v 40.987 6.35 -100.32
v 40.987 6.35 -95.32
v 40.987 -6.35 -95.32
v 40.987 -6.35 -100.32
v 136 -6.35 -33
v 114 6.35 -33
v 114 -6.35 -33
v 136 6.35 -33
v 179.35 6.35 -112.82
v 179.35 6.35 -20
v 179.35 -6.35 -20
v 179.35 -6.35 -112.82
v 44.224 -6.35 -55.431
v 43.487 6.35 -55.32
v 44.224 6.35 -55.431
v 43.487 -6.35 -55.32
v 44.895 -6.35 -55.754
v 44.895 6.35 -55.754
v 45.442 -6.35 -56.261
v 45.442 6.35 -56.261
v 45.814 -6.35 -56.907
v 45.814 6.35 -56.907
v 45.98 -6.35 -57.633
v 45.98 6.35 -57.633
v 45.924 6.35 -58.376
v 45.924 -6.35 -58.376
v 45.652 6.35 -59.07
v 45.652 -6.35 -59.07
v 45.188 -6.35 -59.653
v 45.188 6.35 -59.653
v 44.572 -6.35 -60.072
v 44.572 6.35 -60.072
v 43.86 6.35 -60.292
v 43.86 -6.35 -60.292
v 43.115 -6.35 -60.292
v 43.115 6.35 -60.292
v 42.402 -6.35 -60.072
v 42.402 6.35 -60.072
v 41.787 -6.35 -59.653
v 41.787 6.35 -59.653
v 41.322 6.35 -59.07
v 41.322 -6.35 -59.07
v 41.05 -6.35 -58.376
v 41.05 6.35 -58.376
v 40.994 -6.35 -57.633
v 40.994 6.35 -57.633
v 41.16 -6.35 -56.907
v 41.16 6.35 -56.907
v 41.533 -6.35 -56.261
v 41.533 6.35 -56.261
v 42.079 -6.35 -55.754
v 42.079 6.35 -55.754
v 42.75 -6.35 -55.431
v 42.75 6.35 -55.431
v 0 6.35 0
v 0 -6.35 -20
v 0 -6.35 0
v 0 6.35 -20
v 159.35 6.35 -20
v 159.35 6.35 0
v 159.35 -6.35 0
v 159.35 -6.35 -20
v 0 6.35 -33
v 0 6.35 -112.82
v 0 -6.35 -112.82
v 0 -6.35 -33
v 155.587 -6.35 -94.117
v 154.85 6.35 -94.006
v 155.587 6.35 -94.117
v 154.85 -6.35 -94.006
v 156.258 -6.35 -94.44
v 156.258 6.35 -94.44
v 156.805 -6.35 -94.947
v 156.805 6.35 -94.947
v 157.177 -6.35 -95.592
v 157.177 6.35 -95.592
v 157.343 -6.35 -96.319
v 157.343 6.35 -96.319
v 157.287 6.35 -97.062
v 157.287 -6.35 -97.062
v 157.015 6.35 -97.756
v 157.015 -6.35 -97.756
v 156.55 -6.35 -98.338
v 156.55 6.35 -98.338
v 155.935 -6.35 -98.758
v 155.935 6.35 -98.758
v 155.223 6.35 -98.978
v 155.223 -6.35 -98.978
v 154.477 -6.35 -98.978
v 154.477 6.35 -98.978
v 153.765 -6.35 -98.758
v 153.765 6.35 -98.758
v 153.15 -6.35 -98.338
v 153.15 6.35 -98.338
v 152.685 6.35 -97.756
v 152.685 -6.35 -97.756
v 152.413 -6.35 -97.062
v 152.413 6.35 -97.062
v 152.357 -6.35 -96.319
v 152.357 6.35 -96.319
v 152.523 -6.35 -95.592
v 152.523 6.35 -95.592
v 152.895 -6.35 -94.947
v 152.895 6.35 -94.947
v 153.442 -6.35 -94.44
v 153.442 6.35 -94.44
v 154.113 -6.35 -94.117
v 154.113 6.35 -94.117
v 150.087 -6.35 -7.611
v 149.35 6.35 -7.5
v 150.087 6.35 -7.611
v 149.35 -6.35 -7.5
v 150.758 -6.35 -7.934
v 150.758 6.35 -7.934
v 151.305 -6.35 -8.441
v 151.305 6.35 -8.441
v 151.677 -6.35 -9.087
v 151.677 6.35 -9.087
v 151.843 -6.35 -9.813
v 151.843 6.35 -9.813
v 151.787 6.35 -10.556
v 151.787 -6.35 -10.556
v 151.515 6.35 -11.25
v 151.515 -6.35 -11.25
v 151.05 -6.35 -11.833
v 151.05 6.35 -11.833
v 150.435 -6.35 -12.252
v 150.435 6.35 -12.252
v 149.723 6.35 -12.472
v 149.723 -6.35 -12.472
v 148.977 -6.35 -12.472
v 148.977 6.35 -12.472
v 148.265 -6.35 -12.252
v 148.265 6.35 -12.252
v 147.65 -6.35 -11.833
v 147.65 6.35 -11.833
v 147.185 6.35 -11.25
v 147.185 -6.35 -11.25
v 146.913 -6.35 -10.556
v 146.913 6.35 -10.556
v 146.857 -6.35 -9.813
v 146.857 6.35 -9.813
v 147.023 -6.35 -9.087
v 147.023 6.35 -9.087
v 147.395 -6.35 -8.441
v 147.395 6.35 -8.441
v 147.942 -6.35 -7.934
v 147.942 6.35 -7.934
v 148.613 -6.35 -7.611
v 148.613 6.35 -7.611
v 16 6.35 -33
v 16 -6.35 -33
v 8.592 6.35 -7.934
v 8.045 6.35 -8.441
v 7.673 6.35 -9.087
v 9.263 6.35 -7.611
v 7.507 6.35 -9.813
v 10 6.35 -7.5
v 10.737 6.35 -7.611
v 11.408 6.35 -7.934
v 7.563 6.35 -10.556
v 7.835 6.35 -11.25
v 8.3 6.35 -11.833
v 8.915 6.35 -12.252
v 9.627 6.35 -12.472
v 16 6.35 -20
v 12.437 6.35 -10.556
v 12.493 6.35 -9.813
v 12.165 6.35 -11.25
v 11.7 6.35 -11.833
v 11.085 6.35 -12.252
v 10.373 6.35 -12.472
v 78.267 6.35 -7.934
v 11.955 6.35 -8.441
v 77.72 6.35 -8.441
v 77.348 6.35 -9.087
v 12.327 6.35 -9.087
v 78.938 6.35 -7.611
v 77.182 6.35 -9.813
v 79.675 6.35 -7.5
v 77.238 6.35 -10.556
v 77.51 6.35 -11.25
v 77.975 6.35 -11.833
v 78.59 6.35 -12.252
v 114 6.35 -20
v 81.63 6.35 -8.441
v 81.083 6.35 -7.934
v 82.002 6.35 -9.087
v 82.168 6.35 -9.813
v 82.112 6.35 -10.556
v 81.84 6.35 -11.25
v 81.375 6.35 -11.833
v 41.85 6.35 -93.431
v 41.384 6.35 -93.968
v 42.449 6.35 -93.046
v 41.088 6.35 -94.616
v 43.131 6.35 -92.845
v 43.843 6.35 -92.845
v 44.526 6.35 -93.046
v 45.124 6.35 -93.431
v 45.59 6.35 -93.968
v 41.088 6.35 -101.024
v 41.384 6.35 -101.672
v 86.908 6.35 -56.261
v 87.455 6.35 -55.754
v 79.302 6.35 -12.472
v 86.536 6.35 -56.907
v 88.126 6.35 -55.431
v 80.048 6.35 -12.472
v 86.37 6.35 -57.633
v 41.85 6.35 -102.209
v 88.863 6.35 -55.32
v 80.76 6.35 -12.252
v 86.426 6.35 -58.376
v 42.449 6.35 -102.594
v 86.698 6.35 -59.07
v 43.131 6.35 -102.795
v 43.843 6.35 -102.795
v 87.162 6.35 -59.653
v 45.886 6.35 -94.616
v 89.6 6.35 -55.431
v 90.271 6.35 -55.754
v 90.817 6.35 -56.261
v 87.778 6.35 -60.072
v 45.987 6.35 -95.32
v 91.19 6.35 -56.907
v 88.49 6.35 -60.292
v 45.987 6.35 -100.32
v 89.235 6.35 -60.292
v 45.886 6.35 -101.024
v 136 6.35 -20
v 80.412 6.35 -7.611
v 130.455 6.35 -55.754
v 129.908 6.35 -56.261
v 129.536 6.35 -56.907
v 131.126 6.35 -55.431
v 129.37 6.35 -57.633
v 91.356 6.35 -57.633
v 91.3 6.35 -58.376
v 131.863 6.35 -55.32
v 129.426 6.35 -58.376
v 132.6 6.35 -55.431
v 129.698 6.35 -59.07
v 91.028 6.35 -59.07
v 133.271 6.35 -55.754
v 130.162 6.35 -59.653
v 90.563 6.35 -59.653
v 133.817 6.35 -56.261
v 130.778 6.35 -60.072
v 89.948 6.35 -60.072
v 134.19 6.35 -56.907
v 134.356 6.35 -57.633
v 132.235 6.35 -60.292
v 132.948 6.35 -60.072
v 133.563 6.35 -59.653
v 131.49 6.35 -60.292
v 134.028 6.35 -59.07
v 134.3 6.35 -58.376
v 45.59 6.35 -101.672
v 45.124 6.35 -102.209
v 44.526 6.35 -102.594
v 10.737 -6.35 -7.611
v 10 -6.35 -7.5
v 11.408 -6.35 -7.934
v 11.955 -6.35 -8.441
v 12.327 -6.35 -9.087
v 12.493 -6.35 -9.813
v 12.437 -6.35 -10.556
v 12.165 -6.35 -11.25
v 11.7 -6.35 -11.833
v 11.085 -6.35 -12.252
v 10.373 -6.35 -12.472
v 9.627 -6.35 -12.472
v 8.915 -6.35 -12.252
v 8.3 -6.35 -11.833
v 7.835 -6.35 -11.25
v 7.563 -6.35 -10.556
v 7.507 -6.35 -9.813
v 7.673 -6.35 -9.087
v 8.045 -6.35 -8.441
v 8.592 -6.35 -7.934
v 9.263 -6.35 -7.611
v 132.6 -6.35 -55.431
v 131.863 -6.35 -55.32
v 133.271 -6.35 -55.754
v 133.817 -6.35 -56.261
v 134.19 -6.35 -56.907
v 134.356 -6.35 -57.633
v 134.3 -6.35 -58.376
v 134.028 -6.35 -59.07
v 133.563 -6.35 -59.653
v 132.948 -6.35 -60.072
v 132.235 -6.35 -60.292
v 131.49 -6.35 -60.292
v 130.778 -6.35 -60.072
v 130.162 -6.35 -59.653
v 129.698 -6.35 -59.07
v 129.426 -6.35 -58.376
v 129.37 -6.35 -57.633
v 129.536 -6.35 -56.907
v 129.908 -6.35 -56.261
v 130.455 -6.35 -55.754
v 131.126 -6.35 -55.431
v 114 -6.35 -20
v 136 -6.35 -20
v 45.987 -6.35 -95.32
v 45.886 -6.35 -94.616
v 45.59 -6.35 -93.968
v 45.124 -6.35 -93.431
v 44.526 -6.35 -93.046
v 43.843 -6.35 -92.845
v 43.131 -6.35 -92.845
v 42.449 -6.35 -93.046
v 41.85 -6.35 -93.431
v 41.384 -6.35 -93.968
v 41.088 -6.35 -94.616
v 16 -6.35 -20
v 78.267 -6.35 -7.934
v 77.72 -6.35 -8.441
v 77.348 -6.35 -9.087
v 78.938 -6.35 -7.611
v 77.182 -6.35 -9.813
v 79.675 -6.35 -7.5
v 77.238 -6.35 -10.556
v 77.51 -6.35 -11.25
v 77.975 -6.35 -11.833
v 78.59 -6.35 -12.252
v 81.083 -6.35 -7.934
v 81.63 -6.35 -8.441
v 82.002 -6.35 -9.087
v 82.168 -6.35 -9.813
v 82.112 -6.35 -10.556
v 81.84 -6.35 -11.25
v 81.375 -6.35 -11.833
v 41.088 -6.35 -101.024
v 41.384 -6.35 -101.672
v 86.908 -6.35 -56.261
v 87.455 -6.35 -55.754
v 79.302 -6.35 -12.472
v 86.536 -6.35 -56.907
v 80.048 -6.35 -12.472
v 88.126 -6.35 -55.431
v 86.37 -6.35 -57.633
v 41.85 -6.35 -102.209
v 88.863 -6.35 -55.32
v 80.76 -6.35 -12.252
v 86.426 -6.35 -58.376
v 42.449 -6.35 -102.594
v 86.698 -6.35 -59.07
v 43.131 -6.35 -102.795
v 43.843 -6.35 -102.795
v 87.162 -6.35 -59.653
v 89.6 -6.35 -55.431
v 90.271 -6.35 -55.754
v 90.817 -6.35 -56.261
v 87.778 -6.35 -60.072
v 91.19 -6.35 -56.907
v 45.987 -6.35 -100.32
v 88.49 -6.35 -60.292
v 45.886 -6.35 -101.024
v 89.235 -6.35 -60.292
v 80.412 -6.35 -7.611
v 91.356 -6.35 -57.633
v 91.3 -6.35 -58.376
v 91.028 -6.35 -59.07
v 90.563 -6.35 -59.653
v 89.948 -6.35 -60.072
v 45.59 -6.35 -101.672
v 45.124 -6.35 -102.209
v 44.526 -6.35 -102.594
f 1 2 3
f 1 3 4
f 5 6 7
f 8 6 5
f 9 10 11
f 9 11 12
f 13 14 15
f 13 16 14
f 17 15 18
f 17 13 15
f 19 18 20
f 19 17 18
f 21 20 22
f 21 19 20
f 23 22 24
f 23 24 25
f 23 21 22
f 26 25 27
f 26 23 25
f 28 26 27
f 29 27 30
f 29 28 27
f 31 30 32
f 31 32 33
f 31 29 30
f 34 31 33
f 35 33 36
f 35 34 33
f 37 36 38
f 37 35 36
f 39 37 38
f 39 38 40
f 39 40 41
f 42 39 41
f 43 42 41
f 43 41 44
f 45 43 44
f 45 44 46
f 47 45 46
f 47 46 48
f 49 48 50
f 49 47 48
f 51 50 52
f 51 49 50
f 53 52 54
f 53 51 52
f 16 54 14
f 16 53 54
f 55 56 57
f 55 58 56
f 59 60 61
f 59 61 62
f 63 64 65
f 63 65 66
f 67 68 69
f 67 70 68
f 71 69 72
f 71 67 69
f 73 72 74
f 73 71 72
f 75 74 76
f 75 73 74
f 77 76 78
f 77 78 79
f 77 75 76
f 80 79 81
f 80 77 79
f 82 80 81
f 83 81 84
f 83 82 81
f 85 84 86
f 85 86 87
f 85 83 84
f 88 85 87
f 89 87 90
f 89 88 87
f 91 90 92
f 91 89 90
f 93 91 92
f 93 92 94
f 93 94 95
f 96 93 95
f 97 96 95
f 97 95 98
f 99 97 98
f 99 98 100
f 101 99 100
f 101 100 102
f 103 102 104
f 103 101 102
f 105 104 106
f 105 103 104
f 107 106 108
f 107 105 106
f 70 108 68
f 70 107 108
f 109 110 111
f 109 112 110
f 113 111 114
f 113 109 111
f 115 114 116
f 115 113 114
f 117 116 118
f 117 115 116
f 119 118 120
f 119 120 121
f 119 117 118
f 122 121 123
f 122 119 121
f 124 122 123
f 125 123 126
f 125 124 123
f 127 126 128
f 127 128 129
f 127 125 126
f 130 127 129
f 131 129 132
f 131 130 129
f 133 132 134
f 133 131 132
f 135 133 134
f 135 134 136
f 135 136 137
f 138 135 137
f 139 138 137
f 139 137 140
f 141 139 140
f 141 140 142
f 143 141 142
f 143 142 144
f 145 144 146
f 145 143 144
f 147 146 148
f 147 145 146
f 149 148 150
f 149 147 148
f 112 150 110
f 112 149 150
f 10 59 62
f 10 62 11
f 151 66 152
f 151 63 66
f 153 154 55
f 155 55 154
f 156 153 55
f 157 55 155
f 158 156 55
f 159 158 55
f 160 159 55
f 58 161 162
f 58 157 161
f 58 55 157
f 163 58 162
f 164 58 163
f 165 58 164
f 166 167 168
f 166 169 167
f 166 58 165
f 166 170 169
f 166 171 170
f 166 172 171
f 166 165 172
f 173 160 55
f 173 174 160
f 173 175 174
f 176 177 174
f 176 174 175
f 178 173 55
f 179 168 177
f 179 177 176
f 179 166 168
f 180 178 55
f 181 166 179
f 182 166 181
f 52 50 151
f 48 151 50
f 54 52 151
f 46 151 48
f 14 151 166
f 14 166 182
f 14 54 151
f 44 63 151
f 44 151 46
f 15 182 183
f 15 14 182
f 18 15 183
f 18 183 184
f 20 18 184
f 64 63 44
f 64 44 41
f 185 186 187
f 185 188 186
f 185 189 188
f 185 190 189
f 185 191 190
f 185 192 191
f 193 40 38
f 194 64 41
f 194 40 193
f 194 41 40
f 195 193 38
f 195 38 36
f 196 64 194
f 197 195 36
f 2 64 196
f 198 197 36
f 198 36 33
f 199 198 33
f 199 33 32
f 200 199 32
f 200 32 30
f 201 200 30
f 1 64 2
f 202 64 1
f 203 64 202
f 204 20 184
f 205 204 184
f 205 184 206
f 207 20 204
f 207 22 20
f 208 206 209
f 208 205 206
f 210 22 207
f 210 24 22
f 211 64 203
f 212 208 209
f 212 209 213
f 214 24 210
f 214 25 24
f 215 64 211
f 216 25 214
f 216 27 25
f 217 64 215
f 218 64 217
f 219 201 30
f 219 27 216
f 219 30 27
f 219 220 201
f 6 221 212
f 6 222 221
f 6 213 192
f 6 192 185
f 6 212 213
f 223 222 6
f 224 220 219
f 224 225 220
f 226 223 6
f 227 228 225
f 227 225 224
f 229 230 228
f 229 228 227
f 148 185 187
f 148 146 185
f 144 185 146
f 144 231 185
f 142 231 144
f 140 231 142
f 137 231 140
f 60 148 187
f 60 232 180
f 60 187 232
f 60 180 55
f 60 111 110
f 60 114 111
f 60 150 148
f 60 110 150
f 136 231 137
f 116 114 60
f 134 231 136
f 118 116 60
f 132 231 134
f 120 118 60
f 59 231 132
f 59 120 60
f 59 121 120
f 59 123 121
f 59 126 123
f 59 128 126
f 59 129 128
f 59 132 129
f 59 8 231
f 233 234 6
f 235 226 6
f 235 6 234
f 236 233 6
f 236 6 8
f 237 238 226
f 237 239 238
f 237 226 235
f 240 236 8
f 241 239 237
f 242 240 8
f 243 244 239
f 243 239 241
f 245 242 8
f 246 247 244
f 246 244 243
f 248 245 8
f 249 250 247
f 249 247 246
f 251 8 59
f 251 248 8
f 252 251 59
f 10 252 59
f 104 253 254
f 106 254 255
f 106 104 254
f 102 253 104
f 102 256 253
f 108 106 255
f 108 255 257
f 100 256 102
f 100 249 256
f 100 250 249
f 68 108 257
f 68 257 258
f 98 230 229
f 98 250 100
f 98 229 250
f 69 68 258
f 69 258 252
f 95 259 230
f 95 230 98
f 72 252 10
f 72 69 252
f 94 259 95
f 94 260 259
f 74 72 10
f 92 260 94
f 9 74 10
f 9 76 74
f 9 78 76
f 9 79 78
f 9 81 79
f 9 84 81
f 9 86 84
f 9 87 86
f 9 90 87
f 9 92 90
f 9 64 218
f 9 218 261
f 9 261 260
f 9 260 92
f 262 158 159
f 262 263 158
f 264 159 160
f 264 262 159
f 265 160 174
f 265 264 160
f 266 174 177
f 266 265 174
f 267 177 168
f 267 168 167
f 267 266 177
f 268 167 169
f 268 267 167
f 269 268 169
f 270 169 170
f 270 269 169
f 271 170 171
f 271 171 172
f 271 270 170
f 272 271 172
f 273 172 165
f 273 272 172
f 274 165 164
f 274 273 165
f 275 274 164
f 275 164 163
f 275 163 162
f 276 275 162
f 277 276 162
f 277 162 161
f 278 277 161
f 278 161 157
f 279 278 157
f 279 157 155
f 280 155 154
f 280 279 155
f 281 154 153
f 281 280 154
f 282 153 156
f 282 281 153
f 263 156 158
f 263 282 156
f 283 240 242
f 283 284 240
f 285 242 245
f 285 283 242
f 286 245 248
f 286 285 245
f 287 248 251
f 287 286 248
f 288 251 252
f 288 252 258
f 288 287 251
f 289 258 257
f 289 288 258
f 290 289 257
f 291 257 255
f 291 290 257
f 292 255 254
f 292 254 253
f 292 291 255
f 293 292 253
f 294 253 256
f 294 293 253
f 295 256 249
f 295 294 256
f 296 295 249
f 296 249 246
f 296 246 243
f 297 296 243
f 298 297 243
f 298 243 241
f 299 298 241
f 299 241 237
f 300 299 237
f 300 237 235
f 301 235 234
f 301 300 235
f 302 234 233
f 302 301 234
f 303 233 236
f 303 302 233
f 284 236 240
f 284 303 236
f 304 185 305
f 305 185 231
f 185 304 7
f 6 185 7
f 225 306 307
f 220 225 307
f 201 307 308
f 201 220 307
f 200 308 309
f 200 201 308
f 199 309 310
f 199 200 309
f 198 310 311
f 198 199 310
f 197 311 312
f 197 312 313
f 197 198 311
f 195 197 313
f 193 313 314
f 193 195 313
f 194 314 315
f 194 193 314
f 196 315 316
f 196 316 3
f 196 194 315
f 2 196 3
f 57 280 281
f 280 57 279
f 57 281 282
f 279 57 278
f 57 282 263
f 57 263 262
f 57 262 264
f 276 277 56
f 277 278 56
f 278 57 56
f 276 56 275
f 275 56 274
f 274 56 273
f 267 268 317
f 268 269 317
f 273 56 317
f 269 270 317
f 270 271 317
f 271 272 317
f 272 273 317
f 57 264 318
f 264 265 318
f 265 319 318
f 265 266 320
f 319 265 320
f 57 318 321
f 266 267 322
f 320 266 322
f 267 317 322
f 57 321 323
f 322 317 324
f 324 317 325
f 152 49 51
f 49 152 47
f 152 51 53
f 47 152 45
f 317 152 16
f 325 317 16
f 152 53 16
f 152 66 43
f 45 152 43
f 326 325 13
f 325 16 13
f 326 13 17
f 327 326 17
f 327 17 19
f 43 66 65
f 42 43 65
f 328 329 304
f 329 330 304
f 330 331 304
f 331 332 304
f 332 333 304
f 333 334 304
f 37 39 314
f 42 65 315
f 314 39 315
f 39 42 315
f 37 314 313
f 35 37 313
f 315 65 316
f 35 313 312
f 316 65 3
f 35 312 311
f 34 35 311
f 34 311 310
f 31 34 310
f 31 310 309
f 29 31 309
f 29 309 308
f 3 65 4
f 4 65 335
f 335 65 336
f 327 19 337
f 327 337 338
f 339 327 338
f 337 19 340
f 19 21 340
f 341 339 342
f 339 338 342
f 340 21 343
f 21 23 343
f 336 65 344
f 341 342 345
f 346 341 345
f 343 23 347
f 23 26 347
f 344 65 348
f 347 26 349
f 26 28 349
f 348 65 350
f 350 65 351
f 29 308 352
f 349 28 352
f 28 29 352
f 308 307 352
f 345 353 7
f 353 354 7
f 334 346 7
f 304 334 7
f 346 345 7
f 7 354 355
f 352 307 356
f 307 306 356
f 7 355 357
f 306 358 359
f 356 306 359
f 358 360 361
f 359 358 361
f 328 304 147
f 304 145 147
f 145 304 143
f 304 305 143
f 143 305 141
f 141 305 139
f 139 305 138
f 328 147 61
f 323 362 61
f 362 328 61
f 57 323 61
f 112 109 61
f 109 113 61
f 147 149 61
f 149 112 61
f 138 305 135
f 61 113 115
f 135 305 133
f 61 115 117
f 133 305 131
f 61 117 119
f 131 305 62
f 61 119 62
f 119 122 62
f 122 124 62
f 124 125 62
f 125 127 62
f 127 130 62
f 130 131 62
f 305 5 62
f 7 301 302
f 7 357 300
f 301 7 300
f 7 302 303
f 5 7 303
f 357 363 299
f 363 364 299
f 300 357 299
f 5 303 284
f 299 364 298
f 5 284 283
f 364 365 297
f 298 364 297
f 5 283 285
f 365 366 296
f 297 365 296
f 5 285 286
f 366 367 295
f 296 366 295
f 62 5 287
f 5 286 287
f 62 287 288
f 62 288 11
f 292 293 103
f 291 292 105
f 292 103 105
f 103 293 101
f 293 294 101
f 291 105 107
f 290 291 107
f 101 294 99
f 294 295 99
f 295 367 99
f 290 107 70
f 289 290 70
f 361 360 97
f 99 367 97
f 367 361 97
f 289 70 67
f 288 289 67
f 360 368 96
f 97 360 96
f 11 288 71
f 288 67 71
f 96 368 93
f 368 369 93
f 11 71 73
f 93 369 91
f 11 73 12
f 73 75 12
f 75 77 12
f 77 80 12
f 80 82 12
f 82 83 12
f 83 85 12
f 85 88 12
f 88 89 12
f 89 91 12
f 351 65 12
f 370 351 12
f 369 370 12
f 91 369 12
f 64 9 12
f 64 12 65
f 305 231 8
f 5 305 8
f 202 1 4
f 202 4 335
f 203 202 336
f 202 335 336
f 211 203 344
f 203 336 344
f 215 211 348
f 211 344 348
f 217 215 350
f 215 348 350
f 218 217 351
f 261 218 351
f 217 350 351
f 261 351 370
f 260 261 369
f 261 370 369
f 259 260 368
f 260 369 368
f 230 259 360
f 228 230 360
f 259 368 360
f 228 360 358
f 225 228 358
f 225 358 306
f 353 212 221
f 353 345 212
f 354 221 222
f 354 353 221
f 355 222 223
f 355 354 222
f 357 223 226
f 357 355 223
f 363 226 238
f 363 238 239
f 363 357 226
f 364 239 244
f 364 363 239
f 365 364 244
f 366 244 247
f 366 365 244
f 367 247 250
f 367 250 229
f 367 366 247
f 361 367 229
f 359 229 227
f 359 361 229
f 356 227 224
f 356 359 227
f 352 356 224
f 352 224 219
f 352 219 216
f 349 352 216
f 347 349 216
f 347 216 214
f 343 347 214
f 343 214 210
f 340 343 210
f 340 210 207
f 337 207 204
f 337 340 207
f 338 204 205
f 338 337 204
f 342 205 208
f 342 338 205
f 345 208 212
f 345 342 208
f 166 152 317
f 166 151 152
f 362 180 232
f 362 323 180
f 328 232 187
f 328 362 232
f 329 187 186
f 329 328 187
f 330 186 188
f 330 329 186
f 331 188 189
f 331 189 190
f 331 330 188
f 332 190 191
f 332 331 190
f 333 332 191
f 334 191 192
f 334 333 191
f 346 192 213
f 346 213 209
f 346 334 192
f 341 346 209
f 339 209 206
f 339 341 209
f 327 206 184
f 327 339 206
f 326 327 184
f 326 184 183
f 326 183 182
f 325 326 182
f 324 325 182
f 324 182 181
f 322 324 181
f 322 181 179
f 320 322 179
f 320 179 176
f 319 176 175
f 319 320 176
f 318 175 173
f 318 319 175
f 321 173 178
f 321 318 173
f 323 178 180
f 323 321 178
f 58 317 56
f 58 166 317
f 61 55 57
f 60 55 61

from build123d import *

# Parameters (mm, degrees)
SKETCH1_R           = 2.5
SKETCH1_W           = 22
SKETCH1_H           = 13
BOSS_EXTRUDE1_DEPTH = 6.35


with BuildPart() as part:
    # Sketch1 → Boss-Extrude1 (new, symmetric)
    with BuildSketch(Plane(origin=(0, 0, 0), x_dir=(1, 0, 0), z_dir=(0, 1, 0))):
        Polygon((0, 0), (159.35, 0), (159.35, 20), (179.35, 20), (179.35, 112.82), (0, 112.82), (0, 33), (16, 33), (16, 20), (0, 20), align=None)
        with Locations(Location((43.48717527, 57.82, 0), (0, 0, 270))):
            Circle(SKETCH1_R, mode=Mode.SUBTRACT)
        with Locations(Location((88.86282473, 57.82, 0), (0, 0, 270))):
            Circle(SKETCH1_R, mode=Mode.SUBTRACT)
        with Locations(Location((131.86282473, 57.82, 0), (0, 0, 270))):
            Circle(SKETCH1_R, mode=Mode.SUBTRACT)
        with Locations(Location((154.85, 96.505782571, 0), (0, 0, 270))):
            Circle(SKETCH1_R, mode=Mode.SUBTRACT)
        with Locations(Location((10, 10, 0), (0, 0, 270))):
            Circle(SKETCH1_R, mode=Mode.SUBTRACT)
        with Locations(Location((79.675, 10, 0), (0, 0, 270))):
            Circle(SKETCH1_R, mode=Mode.SUBTRACT)
        with Locations(Location((149.35, 10, 0), (0, 0, 270))):
            Circle(SKETCH1_R, mode=Mode.SUBTRACT)
        with BuildLine():
            Line((40.98717527, 95.32), (40.98717527, 100.32))
            ThreePointArc((40.98717527, 100.32), (43.48717527, 102.82), (45.98717527, 100.32))
            Line((45.98717527, 100.32), (45.98717527, 95.32))
            ThreePointArc((45.98717527, 95.32), (43.48717527, 92.82), (40.98717527, 95.32))
        make_face(mode=Mode.SUBTRACT)
        with Locations((125, 26.5)):
            Rectangle(SKETCH1_W, SKETCH1_H, mode=Mode.SUBTRACT)
    extrude(amount=BOSS_EXTRUDE1_DEPTH, both=True)


solid = part.part
